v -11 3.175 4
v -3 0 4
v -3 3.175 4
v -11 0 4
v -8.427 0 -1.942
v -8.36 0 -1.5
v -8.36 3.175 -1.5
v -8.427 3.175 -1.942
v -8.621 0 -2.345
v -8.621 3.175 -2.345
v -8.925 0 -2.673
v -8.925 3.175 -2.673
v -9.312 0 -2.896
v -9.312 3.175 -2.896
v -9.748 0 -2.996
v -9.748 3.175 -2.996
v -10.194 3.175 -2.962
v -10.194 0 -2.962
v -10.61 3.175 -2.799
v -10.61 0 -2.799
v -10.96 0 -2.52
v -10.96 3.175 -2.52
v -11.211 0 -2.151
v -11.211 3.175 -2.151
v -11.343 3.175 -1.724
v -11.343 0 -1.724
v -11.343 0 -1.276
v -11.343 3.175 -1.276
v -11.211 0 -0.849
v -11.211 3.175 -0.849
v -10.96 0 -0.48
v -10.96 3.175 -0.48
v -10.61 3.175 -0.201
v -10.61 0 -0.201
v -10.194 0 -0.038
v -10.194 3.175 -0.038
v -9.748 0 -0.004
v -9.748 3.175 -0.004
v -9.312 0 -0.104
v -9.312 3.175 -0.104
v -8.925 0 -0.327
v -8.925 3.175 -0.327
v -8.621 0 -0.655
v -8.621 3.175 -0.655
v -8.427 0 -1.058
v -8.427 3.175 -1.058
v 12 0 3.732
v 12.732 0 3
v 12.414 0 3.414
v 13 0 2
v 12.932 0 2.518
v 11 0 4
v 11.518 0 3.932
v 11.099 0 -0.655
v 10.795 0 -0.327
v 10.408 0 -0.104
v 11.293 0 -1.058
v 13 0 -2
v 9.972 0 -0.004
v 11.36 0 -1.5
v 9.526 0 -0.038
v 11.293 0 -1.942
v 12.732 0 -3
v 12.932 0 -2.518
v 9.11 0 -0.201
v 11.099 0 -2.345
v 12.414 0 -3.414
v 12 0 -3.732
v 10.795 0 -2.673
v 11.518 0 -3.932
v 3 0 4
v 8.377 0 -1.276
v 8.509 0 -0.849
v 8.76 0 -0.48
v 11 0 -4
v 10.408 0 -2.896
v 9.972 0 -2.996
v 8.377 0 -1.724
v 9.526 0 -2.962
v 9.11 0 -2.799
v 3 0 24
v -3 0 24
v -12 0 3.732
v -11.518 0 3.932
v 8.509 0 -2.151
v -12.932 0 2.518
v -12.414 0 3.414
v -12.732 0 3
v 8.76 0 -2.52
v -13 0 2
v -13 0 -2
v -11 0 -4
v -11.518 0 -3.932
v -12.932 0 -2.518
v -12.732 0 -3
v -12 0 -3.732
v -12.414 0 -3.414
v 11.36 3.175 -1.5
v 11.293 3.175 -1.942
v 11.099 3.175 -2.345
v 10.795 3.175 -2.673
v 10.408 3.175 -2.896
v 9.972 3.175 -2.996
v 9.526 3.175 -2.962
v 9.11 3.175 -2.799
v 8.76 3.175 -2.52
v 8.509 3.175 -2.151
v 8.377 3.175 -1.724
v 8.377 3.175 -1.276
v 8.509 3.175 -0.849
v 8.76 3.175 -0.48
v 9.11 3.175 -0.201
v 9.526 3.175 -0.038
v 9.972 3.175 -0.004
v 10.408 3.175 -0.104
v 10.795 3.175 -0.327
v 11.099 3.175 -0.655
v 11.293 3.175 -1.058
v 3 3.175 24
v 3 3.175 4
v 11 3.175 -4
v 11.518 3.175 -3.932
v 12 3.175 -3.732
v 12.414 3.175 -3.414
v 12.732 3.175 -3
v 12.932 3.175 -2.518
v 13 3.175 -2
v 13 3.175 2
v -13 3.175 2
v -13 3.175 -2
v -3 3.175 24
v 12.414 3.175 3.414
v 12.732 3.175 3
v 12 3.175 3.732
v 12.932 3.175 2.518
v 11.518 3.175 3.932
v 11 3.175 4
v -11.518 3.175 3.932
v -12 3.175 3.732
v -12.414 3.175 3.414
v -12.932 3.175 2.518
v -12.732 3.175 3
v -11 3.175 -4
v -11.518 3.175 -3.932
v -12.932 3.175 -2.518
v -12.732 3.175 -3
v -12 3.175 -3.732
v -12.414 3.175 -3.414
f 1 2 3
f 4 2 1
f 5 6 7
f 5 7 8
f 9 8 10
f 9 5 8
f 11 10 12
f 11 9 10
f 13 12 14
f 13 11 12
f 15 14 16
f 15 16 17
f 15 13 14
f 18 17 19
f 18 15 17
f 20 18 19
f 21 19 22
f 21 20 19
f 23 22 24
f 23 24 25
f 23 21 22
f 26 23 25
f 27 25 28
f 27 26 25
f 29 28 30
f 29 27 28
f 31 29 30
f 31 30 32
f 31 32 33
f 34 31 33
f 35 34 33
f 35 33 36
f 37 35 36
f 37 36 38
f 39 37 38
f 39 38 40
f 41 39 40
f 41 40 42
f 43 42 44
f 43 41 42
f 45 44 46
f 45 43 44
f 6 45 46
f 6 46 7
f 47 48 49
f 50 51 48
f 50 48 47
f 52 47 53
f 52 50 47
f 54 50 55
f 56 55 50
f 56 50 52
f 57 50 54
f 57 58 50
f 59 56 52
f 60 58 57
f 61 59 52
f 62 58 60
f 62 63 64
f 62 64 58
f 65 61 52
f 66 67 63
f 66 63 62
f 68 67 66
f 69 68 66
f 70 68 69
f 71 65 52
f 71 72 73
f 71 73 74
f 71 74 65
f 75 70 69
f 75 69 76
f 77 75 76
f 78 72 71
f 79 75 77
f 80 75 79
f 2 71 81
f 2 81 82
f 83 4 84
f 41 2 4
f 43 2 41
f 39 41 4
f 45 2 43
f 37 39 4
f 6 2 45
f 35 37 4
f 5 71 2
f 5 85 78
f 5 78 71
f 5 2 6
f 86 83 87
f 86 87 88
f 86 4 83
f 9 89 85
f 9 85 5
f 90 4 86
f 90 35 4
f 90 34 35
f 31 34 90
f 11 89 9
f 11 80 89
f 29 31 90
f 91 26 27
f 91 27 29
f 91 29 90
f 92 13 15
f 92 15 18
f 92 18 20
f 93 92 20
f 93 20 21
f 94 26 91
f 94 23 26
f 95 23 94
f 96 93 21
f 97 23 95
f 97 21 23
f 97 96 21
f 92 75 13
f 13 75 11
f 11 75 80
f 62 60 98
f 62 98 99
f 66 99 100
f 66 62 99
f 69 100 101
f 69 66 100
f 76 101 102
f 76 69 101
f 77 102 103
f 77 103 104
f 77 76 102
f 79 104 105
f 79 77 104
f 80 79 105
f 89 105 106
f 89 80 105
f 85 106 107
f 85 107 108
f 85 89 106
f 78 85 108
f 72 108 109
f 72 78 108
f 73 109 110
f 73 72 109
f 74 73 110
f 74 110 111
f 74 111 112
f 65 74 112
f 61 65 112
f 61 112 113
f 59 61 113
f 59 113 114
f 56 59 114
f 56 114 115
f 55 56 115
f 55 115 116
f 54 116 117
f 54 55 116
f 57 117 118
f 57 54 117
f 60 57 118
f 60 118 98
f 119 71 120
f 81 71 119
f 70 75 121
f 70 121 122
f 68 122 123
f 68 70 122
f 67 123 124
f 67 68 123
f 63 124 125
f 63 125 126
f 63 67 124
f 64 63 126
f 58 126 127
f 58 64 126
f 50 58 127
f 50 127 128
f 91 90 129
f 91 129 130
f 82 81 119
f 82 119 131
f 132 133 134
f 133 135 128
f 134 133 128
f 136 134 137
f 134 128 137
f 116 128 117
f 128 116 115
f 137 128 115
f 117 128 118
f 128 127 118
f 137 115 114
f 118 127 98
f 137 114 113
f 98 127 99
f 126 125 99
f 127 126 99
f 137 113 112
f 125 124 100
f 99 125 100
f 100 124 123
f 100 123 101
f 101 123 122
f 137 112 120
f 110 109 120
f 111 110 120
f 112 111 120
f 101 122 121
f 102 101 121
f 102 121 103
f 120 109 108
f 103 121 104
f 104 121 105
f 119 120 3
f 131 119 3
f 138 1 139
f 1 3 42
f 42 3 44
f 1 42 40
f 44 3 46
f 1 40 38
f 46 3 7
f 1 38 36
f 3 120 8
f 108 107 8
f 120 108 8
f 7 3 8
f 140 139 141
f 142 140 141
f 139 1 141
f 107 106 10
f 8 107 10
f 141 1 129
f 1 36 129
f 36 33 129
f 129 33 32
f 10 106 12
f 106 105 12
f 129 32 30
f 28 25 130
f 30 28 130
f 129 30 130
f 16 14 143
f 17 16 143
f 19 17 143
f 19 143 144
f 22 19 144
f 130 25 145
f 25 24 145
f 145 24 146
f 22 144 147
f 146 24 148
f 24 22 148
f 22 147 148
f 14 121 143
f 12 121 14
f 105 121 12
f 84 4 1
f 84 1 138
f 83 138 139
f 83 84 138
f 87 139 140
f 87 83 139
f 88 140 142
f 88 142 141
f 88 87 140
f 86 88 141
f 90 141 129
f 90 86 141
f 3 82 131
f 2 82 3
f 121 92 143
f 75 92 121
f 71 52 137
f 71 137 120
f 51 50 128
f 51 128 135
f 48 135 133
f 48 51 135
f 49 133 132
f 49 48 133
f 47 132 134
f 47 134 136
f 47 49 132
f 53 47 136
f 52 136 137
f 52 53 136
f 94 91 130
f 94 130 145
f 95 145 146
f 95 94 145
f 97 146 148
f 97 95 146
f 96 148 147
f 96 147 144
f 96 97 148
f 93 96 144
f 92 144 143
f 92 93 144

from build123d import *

# Parameters (mm, degrees)
SKETCH_1_R      = 1.5
EXTRUDE_1_DEPTH = 3.175


with BuildPart() as part:
    # 草图1 → 凸台-拉伸1 (new body)
    with BuildSketch(Plane(origin=(0, 0, 0), x_dir=(1, 0, 0), z_dir=(0, 1, 0))):
        with BuildLine():
            Line((-11, 4), (11, 4))
            ThreePointArc((11, 4), (12.414213562, 3.414213562), (13, 2))
            Line((13, 2), (13, -2))
            ThreePointArc((13, -2), (12.414213562, -3.414213562), (11, -4))
            Line((11, -4), (3, -4))
            Line((3, -4), (3, -24))
            Line((3, -24), (-3, -24))
            Line((-3, -24), (-3, -4))
            Line((-3, -4), (-11, -4))
            ThreePointArc((-11, -4), (-12.414213562, -3.414213562), (-13, -2))
            Line((-13, -2), (-13, 2))
            ThreePointArc((-13, 2), (-12.414213562, 3.414213562), (-11, 4))
        make_face()
        with Locations((-9.86, 1.5)):
            Circle(SKETCH_1_R, mode=Mode.SUBTRACT)
        with Locations((9.86, 1.5)):
            Circle(SKETCH_1_R, mode=Mode.SUBTRACT)
    extrude(amount=EXTRUDE_1_DEPTH)


solid = part.part
